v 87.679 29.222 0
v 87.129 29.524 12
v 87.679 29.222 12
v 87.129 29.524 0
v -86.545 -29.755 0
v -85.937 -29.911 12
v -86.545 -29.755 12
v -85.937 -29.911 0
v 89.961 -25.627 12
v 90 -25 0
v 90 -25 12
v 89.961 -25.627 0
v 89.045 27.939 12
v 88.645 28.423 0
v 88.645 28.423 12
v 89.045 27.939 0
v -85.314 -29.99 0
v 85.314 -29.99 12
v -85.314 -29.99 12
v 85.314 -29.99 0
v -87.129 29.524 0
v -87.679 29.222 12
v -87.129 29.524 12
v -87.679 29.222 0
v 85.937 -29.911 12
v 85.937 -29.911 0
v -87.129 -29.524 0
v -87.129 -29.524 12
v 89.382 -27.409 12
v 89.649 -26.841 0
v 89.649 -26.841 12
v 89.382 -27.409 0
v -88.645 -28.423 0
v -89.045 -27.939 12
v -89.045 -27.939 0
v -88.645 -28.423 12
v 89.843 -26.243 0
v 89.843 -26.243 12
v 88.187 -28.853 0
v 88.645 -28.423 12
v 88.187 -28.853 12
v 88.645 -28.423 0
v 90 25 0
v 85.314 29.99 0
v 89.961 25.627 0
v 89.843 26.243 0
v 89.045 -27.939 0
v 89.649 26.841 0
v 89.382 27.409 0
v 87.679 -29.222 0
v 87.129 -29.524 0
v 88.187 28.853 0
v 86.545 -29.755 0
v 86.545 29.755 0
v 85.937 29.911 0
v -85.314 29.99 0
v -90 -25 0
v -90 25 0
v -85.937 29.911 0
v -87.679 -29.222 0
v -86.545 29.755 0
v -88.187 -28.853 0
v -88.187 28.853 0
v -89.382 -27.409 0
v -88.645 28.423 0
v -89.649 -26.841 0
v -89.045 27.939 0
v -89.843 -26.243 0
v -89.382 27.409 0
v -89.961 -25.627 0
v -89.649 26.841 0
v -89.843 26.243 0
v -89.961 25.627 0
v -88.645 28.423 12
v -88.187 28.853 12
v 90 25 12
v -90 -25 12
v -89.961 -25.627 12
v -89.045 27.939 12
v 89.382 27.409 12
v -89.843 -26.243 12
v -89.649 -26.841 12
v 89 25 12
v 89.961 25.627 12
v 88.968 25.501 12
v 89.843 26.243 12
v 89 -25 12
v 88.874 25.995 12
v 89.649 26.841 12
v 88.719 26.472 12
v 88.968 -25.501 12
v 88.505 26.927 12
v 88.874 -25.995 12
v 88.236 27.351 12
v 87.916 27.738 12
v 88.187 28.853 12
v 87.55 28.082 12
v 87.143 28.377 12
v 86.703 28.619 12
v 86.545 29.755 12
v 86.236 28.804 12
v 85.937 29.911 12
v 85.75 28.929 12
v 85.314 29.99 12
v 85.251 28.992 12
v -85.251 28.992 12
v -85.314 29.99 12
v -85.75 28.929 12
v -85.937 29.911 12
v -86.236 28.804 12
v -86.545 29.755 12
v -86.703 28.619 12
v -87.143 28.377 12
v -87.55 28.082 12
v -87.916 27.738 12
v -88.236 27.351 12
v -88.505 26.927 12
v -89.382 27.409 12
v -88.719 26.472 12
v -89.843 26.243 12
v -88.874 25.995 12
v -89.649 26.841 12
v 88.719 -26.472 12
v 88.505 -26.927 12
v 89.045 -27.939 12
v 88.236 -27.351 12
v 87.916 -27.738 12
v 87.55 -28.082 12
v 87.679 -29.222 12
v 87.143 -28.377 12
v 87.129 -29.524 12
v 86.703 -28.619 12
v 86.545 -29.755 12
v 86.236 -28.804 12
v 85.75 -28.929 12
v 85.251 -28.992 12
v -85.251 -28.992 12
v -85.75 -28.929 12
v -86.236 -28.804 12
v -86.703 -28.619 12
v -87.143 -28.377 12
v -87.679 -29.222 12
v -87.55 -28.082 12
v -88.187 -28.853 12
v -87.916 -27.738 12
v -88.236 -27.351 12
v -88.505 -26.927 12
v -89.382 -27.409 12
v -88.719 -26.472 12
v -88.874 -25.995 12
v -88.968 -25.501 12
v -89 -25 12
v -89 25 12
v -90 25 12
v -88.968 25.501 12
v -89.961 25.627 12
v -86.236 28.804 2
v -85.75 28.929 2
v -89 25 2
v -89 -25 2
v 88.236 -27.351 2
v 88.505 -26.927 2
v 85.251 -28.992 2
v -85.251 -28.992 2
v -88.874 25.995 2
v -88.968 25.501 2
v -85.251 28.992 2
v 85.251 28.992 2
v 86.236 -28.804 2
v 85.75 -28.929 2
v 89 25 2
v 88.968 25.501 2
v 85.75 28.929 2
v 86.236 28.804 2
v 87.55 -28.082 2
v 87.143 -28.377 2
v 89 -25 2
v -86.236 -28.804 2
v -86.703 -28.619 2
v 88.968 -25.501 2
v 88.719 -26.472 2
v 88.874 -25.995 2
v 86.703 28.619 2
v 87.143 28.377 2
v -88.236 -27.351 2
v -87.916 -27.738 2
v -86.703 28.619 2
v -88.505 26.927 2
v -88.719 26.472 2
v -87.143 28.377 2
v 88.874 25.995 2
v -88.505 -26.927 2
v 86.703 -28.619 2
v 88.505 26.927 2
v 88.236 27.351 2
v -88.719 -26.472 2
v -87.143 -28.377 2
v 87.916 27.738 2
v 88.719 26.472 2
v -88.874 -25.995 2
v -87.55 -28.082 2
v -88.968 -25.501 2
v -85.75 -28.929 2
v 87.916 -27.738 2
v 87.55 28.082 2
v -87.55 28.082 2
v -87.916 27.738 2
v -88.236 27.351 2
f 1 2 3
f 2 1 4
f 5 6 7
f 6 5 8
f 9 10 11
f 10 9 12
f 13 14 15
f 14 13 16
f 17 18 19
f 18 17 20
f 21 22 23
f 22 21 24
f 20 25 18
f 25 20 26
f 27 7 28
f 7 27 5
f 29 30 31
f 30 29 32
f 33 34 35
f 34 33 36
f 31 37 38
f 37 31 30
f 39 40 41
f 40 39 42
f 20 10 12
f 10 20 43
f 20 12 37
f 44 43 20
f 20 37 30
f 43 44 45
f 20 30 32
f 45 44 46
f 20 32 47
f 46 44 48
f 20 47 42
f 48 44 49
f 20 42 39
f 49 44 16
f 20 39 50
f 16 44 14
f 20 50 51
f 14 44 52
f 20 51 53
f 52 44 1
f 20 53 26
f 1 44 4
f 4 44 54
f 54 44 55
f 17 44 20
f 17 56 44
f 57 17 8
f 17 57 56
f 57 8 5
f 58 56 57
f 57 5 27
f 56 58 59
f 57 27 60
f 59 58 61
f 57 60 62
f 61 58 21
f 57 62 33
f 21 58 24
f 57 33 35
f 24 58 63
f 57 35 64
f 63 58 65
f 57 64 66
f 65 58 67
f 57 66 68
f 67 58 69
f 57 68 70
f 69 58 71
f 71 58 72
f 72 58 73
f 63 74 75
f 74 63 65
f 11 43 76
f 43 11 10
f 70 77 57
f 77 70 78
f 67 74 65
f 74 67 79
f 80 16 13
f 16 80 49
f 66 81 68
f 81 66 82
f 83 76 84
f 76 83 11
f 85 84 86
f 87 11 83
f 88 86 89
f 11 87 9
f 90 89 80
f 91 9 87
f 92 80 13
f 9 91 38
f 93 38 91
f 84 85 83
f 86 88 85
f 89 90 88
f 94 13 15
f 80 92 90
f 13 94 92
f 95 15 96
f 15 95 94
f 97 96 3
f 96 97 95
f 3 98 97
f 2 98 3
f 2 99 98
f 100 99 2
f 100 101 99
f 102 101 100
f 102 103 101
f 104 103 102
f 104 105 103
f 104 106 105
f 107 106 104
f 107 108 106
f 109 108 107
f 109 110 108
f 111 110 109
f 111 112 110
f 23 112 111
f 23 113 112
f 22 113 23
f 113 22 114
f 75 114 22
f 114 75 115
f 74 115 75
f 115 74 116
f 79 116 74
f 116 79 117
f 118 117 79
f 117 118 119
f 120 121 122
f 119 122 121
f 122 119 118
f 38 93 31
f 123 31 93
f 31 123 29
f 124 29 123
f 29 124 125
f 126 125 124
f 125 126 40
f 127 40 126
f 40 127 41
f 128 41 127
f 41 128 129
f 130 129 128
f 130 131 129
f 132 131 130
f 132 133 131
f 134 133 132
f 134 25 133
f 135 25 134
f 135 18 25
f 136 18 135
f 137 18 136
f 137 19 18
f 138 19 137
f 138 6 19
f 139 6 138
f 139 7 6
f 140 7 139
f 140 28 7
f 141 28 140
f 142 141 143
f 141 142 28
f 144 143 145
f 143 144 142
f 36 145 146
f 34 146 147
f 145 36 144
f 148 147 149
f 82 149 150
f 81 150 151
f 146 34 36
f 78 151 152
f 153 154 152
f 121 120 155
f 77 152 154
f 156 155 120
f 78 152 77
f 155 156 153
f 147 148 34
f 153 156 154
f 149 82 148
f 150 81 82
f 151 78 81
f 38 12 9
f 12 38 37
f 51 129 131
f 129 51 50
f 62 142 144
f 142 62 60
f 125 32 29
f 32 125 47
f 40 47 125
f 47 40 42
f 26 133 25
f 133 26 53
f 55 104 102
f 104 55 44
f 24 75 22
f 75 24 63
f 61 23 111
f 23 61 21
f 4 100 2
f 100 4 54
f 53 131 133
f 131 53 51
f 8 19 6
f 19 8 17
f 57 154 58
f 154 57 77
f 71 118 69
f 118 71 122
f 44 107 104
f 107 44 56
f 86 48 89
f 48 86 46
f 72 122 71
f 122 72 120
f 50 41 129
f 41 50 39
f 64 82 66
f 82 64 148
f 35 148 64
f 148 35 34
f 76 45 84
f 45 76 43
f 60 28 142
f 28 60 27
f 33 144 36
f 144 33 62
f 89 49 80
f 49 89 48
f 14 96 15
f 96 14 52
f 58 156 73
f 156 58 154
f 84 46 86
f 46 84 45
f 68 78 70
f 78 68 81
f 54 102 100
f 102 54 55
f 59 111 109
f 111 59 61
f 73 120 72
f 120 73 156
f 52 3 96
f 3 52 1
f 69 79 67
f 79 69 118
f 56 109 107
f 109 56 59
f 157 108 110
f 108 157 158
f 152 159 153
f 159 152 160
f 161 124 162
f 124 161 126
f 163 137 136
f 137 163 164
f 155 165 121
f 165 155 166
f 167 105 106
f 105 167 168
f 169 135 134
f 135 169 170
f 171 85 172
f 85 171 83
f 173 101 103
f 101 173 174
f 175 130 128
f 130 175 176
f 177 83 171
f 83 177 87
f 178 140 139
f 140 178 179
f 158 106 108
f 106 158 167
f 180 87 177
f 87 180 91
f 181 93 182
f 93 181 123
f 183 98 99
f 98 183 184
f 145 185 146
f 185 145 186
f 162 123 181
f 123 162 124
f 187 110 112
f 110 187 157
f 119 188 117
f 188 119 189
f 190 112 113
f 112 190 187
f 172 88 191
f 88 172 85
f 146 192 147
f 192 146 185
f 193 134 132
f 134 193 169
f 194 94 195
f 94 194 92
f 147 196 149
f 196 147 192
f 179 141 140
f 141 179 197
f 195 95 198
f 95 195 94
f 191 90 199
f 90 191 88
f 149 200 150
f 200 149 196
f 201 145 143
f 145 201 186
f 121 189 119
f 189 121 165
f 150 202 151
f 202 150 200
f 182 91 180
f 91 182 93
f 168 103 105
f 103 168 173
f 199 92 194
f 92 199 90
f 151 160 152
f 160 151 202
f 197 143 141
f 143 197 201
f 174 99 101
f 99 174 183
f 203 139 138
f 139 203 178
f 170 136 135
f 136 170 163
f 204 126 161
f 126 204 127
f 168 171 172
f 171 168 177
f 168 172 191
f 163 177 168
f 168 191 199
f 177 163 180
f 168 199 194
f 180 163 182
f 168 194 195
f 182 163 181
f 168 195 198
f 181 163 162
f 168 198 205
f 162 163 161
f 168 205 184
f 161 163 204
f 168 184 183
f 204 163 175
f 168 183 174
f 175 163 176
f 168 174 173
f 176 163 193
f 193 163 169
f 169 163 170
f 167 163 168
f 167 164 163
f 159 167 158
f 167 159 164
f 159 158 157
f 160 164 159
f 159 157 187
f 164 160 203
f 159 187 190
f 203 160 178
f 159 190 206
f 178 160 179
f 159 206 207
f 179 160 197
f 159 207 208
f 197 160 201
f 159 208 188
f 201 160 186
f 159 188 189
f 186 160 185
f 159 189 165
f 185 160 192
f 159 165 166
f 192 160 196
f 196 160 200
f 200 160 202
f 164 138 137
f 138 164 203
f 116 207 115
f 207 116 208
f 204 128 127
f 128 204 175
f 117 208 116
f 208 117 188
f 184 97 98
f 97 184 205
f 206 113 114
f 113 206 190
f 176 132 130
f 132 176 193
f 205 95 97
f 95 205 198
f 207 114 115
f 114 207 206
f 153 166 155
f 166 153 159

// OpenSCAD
$fn = 50;


difference() {
	union() {
		hull() {
			translate(v = [-85.0000000000, 25.0000000000, 0]) {
				cylinder(h = 12, r = 5);
			}
			translate(v = [85.0000000000, 25.0000000000, 0]) {
				cylinder(h = 12, r = 5);
			}
			translate(v = [-85.0000000000, -25.0000000000, 0]) {
				cylinder(h = 12, r = 5);
			}
			translate(v = [85.0000000000, -25.0000000000, 0]) {
				cylinder(h = 12, r = 5);
			}
		}
	}
	union() {
		translate(v = [0, 0, 2]) {
			hull() {
				translate(v = [-85.0000000000, 25.0000000000, 0]) {
					cylinder(h = 10, r = 4);
				}
				translate(v = [85.0000000000, 25.0000000000, 0]) {
					cylinder(h = 10, r = 4);
				}
				translate(v = [-85.0000000000, -25.0000000000, 0]) {
					cylinder(h = 10, r = 4);
				}
				translate(v = [85.0000000000, -25.0000000000, 0]) {
					cylinder(h = 10, r = 4);
				}
			}
		}
	}
}
